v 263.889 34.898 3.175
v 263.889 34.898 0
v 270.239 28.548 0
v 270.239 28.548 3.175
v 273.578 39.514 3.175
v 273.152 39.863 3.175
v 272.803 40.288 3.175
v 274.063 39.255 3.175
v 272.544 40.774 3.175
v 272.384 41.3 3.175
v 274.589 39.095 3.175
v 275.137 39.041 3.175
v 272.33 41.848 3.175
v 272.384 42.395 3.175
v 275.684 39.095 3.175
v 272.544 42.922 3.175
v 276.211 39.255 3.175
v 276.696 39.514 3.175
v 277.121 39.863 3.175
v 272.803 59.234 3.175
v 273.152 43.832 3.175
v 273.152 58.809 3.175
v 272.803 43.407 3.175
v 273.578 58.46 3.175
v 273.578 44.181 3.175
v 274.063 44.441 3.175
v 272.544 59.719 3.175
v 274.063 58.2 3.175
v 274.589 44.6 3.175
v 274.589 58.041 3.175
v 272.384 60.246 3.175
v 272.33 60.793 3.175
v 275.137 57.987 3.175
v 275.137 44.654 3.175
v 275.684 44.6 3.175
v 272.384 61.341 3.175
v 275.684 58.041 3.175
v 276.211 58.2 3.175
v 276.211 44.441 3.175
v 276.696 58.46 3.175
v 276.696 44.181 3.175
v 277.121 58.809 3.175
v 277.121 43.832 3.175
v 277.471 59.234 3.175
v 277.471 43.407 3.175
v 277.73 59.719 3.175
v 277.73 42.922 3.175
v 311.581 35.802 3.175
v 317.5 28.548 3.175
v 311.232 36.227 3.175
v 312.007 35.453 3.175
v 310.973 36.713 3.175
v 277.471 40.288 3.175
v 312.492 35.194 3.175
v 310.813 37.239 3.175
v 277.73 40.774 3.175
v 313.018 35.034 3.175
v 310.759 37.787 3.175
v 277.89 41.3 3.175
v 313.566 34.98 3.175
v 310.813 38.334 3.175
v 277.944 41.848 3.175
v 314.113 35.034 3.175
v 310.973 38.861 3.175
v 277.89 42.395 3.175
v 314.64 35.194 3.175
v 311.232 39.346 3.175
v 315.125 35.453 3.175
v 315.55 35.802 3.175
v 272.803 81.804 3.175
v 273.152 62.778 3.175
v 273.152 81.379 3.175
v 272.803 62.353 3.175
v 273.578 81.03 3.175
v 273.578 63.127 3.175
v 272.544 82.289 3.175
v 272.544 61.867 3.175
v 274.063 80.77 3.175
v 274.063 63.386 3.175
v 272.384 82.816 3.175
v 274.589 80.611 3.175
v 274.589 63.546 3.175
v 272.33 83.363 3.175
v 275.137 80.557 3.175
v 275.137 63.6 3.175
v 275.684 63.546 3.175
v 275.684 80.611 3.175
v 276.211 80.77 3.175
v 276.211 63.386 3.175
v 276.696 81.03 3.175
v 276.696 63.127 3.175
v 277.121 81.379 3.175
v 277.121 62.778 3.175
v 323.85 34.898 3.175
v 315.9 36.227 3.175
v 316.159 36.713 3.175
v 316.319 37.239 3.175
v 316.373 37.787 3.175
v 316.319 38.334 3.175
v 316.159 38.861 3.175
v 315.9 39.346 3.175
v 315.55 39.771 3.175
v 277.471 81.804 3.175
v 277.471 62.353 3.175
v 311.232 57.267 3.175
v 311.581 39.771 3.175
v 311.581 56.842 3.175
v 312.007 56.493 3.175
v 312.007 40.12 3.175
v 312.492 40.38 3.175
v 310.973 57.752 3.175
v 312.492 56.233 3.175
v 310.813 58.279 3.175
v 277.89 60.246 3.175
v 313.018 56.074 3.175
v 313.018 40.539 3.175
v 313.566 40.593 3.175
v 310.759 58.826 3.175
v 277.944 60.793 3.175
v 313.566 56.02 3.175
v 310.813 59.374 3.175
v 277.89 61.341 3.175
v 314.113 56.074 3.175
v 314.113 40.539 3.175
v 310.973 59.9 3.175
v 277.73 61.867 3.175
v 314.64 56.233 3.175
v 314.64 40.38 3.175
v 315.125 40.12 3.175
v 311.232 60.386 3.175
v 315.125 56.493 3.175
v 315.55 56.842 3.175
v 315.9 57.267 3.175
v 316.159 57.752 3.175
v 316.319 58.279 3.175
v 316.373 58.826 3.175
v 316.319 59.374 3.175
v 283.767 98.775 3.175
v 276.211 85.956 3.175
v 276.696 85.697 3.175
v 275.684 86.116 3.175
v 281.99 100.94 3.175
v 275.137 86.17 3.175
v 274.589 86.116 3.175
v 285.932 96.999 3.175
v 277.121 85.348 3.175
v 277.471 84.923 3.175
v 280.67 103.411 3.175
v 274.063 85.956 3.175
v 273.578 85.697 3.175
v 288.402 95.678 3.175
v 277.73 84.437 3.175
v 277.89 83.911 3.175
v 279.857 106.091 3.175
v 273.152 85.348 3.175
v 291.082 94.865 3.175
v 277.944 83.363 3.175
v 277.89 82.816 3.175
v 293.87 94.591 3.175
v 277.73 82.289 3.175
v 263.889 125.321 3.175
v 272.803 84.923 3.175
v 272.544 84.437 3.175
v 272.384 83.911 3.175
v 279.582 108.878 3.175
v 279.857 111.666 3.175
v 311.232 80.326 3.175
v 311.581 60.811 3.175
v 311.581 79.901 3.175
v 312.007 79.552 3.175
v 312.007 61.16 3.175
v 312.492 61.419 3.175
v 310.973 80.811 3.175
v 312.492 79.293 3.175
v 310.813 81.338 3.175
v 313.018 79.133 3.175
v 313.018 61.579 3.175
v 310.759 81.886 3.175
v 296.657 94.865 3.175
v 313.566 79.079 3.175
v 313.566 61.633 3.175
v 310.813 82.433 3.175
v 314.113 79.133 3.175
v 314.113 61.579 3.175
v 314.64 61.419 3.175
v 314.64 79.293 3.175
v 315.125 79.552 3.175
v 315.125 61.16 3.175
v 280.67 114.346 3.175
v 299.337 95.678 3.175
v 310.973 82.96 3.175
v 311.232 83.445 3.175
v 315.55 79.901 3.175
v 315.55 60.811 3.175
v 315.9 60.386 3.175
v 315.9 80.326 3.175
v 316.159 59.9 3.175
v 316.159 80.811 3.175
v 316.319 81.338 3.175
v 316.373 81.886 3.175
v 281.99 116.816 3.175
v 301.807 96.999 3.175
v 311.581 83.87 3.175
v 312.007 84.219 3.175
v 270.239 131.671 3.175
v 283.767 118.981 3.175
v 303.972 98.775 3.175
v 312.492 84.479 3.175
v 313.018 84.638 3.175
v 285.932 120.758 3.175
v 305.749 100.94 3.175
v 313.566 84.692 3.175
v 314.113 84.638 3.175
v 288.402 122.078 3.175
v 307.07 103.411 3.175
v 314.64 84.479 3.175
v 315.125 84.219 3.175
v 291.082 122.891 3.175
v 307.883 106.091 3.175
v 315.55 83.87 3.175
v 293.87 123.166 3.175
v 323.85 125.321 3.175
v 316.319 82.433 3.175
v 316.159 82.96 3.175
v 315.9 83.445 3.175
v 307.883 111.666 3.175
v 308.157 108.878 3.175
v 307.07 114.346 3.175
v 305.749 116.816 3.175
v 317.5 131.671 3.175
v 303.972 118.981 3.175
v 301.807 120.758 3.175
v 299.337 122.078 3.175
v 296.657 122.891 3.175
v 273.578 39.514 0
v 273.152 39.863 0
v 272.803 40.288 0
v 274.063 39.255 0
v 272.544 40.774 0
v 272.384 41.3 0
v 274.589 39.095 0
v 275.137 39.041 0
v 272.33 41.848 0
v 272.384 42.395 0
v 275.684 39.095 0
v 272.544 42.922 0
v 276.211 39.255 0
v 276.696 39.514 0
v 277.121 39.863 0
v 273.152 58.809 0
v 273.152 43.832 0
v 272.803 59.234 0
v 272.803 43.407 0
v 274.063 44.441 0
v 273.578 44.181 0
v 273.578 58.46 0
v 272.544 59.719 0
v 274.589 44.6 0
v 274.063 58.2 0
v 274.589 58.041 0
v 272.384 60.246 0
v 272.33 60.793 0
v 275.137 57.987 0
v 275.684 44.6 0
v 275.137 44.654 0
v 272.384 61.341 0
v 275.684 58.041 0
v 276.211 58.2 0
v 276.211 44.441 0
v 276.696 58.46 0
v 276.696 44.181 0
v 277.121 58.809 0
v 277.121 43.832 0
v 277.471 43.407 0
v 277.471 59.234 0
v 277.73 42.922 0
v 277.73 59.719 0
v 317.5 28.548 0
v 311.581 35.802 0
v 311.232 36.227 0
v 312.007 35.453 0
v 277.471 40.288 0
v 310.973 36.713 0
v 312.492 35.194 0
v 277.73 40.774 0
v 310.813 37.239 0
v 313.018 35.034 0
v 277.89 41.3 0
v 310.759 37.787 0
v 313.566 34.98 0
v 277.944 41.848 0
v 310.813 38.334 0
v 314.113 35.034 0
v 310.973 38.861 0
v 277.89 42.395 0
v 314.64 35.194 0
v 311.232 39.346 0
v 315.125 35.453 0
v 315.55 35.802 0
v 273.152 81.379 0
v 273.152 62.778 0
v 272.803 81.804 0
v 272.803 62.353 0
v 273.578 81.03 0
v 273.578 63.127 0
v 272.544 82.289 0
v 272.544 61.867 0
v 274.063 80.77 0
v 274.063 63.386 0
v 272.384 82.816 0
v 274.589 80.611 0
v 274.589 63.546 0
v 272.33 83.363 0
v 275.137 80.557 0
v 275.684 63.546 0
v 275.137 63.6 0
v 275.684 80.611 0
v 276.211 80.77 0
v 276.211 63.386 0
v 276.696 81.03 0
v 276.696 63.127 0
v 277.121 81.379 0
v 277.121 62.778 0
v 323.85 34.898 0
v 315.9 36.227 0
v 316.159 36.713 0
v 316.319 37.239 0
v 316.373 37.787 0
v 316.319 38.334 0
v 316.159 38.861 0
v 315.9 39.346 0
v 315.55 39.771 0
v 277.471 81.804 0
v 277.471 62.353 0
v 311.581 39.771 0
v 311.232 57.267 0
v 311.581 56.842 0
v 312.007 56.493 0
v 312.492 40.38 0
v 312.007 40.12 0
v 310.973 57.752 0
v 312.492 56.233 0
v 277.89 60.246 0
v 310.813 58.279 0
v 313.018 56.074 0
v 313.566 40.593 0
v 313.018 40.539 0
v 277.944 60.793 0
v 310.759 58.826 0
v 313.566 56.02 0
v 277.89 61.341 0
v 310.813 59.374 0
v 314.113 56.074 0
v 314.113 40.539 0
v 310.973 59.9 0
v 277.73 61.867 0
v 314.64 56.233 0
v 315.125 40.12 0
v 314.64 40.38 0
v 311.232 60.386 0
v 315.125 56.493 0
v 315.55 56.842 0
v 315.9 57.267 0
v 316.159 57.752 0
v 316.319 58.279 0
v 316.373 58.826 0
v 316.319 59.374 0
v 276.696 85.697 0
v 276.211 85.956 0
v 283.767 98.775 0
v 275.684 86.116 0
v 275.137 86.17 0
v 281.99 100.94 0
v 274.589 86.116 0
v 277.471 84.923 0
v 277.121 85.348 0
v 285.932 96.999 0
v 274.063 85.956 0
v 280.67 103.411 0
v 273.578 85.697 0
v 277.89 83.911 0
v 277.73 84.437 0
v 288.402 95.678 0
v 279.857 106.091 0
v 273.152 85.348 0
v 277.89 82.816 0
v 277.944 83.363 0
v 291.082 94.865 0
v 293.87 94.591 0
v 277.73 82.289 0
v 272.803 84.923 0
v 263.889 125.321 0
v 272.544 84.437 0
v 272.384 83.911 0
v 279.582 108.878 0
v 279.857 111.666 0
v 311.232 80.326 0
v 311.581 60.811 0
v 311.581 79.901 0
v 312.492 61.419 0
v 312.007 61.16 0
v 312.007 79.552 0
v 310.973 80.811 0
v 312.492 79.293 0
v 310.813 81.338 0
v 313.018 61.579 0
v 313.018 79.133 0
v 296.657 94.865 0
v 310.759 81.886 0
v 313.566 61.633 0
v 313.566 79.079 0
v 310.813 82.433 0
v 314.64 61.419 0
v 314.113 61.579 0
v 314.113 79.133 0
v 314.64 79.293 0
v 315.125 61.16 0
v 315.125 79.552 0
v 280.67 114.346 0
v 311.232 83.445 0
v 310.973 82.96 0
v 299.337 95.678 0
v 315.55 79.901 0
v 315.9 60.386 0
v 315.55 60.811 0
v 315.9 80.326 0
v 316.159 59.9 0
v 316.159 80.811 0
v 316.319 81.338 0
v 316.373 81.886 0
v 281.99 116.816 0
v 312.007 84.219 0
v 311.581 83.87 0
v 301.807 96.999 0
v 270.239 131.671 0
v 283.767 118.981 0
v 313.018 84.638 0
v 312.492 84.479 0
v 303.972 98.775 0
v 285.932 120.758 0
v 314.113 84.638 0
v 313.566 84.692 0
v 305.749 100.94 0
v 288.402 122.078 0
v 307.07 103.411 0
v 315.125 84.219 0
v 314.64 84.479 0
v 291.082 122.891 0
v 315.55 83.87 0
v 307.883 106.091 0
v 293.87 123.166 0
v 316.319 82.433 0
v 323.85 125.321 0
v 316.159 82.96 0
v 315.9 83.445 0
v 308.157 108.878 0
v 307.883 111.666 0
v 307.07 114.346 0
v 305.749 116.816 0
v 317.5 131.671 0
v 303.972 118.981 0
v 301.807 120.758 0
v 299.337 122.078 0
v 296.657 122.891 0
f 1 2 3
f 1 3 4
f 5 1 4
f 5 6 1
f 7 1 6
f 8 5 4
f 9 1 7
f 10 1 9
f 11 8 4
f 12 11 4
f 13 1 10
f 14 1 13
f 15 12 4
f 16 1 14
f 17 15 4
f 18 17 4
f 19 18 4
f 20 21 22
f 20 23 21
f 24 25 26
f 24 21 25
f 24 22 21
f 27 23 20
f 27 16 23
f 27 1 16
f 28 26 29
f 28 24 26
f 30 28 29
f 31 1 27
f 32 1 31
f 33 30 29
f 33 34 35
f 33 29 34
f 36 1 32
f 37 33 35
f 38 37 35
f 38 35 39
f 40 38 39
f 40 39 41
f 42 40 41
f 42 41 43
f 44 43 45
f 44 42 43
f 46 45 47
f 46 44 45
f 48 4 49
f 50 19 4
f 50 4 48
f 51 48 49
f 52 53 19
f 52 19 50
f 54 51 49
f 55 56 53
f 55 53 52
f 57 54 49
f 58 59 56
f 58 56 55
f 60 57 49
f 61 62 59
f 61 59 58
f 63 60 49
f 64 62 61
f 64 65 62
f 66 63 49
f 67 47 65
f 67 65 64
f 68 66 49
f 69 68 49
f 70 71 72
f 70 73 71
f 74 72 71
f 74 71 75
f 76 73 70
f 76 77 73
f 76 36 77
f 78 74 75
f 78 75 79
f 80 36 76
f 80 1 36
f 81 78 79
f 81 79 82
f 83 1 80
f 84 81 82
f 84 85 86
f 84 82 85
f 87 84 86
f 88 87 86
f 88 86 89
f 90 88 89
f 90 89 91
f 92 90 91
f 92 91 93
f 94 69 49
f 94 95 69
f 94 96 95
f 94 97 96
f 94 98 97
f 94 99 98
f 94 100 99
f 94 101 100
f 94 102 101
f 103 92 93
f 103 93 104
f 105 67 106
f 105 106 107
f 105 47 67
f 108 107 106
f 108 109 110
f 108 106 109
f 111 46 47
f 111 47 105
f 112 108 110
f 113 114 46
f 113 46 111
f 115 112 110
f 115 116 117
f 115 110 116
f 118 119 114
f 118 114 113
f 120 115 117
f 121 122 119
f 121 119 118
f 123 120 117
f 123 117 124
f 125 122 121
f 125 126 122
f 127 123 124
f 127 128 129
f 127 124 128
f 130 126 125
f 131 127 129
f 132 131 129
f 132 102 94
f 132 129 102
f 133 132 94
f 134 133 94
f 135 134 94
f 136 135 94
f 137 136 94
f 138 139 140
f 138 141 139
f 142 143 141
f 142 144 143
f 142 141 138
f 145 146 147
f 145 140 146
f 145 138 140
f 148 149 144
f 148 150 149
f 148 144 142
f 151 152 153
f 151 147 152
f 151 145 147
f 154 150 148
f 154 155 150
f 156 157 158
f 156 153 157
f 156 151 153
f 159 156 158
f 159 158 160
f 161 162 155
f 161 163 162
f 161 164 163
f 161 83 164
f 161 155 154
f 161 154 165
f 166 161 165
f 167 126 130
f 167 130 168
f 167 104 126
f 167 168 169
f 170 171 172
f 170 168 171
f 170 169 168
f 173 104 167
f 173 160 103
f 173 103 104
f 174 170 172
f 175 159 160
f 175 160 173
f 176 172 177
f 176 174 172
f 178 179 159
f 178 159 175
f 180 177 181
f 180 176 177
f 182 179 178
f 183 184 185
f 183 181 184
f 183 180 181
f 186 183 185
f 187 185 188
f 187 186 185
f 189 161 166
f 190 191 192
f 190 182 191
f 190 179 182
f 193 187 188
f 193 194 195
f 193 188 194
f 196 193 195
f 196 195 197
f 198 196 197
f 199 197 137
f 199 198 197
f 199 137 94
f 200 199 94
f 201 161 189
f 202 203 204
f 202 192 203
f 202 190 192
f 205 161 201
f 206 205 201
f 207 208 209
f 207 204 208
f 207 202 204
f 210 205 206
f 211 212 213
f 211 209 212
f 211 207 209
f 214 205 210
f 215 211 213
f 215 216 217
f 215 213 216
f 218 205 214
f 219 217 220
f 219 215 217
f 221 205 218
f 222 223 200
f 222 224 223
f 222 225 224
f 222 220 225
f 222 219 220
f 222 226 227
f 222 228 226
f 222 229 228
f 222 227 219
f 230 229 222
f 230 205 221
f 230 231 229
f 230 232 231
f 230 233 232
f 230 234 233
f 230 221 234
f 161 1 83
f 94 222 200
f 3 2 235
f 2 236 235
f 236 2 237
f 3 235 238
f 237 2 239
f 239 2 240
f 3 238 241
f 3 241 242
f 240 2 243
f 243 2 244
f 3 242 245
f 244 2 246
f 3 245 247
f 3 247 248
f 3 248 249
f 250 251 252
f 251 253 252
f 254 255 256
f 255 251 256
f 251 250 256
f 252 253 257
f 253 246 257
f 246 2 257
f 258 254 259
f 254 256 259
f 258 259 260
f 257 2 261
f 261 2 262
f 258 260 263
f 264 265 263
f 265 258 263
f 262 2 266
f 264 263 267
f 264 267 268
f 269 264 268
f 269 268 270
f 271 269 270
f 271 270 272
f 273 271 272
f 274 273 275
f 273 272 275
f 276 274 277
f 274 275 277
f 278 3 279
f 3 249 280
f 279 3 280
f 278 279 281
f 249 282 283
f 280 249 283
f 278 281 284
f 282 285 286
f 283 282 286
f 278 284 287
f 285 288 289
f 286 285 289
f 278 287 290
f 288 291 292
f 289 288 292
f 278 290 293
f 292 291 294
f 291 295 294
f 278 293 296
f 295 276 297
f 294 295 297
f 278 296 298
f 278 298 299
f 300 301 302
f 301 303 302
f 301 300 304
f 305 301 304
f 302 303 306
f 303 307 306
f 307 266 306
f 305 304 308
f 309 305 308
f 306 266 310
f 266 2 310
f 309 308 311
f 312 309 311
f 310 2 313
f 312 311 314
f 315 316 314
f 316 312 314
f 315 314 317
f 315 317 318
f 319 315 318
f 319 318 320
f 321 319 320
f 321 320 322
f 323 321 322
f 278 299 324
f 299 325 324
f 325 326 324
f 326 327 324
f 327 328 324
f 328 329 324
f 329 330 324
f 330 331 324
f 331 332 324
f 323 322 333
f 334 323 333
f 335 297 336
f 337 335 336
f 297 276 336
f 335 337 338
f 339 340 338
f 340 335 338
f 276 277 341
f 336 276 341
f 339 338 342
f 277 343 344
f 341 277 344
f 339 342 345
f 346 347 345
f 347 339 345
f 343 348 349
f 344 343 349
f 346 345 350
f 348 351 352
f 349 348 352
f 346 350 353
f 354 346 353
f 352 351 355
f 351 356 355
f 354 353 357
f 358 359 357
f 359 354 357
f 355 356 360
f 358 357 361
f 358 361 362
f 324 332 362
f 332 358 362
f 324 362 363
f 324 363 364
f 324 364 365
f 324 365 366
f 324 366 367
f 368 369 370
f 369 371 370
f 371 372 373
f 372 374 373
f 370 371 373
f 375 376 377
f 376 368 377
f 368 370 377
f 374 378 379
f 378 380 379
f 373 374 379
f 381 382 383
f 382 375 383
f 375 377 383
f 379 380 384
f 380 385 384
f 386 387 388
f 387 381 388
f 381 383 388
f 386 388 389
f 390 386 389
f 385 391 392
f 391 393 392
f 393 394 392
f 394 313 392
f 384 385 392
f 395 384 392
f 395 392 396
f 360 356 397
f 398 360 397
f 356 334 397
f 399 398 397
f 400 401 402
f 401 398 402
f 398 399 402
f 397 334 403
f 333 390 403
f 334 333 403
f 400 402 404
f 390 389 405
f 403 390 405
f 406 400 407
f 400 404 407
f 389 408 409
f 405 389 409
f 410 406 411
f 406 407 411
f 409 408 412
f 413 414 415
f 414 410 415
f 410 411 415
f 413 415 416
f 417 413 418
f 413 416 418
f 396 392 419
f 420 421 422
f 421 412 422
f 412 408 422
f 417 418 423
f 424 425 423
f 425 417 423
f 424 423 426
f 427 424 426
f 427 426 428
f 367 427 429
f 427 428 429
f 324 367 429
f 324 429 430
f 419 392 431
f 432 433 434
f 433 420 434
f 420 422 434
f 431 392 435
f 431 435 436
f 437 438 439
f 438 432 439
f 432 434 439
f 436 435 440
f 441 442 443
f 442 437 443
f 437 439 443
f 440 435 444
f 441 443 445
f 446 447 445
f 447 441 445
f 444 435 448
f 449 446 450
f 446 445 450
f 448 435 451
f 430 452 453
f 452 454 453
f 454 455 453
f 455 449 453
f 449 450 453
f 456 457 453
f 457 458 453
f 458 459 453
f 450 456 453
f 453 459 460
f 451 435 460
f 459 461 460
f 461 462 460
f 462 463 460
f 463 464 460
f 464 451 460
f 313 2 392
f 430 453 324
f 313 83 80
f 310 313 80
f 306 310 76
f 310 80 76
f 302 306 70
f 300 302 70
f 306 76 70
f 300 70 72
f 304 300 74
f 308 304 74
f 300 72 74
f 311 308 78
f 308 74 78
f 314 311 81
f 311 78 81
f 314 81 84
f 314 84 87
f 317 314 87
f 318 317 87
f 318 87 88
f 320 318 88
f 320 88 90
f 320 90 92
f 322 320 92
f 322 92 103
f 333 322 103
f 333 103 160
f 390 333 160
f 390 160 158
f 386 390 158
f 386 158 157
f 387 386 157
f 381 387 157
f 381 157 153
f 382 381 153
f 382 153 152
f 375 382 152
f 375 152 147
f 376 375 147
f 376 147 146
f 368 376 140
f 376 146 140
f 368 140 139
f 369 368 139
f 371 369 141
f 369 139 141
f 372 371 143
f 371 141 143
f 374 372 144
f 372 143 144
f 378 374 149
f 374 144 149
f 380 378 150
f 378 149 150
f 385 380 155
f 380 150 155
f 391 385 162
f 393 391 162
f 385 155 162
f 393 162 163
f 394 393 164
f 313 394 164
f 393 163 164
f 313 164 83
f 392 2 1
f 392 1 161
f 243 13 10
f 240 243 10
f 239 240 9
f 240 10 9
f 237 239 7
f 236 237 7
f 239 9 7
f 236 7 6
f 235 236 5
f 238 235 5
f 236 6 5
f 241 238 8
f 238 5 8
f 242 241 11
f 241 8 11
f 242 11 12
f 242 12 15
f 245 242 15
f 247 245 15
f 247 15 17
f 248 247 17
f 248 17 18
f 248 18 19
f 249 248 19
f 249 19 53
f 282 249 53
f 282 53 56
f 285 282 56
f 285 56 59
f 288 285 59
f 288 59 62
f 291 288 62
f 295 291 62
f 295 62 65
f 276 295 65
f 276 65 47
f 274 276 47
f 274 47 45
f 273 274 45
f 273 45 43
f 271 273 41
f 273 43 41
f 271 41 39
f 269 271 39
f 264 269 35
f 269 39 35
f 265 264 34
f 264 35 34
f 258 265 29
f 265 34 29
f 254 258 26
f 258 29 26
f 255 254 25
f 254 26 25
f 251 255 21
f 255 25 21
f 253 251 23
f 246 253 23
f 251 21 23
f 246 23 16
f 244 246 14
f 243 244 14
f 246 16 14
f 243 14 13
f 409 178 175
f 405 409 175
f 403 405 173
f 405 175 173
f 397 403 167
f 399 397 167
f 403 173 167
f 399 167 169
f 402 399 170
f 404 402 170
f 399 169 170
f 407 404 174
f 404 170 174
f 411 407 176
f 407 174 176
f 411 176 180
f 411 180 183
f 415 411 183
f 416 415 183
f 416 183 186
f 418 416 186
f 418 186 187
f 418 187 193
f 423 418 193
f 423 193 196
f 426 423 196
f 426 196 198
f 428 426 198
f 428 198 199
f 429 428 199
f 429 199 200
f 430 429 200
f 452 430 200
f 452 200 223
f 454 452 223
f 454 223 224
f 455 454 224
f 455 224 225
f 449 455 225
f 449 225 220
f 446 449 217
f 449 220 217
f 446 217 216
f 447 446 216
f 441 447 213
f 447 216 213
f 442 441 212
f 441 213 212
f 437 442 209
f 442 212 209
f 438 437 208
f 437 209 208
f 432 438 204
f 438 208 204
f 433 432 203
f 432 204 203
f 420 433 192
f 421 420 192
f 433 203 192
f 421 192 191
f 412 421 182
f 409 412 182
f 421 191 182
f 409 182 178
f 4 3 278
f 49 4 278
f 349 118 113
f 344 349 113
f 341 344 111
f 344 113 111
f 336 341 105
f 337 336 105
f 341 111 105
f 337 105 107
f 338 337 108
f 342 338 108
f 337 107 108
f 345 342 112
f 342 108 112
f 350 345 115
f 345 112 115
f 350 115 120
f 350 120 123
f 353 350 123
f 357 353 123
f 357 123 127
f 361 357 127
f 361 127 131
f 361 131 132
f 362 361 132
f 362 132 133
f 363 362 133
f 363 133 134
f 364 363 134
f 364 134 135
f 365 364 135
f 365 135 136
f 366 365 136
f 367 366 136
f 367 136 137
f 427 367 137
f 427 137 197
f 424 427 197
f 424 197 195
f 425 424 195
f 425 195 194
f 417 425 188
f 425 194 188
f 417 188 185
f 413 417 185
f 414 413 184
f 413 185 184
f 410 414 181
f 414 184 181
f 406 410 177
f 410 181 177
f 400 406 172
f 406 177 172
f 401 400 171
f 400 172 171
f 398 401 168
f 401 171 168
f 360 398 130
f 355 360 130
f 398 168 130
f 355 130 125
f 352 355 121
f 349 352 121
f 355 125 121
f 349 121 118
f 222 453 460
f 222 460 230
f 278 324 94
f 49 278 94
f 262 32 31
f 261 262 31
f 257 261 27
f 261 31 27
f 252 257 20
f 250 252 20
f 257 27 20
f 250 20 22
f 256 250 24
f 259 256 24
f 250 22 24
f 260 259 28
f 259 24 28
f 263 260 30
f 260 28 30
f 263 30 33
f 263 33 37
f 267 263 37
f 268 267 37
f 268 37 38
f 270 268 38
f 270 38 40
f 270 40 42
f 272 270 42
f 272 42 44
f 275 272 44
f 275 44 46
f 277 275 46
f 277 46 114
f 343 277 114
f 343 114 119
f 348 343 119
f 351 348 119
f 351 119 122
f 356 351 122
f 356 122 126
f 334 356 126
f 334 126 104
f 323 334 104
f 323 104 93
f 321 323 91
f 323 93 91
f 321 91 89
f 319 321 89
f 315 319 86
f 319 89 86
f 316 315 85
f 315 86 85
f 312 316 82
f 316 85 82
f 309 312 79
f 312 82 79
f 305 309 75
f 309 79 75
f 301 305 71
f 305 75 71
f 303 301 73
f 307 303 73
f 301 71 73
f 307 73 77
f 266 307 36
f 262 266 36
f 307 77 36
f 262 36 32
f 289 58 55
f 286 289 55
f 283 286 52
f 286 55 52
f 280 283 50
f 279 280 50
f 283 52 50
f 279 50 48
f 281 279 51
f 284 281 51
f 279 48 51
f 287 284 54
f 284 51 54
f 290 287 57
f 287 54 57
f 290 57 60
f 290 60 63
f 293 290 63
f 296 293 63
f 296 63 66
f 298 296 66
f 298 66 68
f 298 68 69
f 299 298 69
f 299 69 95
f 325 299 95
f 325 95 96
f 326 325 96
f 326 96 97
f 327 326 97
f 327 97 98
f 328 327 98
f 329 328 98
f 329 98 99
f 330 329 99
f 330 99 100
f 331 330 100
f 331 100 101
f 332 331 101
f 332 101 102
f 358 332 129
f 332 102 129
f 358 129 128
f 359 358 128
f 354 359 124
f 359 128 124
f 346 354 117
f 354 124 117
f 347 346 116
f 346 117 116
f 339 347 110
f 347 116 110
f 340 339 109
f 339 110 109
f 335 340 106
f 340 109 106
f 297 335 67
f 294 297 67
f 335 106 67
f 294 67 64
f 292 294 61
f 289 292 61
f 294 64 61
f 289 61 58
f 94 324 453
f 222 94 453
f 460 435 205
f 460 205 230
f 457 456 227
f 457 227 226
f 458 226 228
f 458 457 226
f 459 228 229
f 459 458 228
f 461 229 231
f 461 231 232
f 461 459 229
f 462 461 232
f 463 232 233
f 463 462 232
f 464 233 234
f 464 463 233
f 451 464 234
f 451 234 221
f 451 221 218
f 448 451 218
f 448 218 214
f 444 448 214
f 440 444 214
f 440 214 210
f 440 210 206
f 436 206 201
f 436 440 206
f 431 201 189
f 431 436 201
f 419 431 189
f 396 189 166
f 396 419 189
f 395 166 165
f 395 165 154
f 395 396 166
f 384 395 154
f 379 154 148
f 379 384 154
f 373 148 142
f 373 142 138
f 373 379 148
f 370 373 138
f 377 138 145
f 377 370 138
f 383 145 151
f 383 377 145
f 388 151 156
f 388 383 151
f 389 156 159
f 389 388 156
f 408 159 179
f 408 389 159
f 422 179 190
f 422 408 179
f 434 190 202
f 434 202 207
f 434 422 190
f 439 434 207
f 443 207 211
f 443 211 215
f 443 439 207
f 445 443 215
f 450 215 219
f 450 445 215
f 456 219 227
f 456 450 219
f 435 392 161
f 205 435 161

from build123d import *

# Parameters (mm, degrees)
SKETCH1_W              = 59.960812413
SKETCH1_H              = 103.12305947
SKETCH1_R              = 14.2875
BOSS_EXTRUDE1_DEPTH    = 3.175
CHAMFER1_SIZE          = 6.35
F_10_CLEARANCE_HOLE1_D = 5.6134


with BuildPart() as part:
    # Sketch1 → Boss-Extrude1 (new body)
    with BuildSketch(Plane.XY):
        with Locations((293.869593794, 80.109690656)):
            Rectangle(SKETCH1_W, SKETCH1_H)
        with Locations((293.869593793, 108.878190342)):
            Circle(SKETCH1_R, mode=Mode.SUBTRACT)
    extrude(amount=BOSS_EXTRUDE1_DEPTH)

    # Chamfer1
    chamfer1_edges = [part.edges().sort_by_distance(p)[0] for p in [
        (323.85, 28.548160921, 1.5875),
        (263.889187587, 28.548160921, 1.5875),
        (263.889187587, 131.671220391, 1.5875),
        (323.85, 131.671220391, 1.5875),
    ]]
    chamfer(chamfer1_edges, length=CHAMFER1_SIZE)

    # #10 Clearance Hole1 (through all)
    with Locations(Plane(origin=(0, 0, 0), x_dir=(1, 0, 0), z_dir=(0, 0, -1))):
        with Locations((275.136823716, -83.363402248), (275.136823716, -60.793377217), (313.56584092, -58.826399941), (313.56584092, -81.885554343), (275.136823716, -41.847646884), (313.56584092, -37.78667564)):
            Hole(F_10_CLEARANCE_HOLE1_D / 2)


solid = part.part
